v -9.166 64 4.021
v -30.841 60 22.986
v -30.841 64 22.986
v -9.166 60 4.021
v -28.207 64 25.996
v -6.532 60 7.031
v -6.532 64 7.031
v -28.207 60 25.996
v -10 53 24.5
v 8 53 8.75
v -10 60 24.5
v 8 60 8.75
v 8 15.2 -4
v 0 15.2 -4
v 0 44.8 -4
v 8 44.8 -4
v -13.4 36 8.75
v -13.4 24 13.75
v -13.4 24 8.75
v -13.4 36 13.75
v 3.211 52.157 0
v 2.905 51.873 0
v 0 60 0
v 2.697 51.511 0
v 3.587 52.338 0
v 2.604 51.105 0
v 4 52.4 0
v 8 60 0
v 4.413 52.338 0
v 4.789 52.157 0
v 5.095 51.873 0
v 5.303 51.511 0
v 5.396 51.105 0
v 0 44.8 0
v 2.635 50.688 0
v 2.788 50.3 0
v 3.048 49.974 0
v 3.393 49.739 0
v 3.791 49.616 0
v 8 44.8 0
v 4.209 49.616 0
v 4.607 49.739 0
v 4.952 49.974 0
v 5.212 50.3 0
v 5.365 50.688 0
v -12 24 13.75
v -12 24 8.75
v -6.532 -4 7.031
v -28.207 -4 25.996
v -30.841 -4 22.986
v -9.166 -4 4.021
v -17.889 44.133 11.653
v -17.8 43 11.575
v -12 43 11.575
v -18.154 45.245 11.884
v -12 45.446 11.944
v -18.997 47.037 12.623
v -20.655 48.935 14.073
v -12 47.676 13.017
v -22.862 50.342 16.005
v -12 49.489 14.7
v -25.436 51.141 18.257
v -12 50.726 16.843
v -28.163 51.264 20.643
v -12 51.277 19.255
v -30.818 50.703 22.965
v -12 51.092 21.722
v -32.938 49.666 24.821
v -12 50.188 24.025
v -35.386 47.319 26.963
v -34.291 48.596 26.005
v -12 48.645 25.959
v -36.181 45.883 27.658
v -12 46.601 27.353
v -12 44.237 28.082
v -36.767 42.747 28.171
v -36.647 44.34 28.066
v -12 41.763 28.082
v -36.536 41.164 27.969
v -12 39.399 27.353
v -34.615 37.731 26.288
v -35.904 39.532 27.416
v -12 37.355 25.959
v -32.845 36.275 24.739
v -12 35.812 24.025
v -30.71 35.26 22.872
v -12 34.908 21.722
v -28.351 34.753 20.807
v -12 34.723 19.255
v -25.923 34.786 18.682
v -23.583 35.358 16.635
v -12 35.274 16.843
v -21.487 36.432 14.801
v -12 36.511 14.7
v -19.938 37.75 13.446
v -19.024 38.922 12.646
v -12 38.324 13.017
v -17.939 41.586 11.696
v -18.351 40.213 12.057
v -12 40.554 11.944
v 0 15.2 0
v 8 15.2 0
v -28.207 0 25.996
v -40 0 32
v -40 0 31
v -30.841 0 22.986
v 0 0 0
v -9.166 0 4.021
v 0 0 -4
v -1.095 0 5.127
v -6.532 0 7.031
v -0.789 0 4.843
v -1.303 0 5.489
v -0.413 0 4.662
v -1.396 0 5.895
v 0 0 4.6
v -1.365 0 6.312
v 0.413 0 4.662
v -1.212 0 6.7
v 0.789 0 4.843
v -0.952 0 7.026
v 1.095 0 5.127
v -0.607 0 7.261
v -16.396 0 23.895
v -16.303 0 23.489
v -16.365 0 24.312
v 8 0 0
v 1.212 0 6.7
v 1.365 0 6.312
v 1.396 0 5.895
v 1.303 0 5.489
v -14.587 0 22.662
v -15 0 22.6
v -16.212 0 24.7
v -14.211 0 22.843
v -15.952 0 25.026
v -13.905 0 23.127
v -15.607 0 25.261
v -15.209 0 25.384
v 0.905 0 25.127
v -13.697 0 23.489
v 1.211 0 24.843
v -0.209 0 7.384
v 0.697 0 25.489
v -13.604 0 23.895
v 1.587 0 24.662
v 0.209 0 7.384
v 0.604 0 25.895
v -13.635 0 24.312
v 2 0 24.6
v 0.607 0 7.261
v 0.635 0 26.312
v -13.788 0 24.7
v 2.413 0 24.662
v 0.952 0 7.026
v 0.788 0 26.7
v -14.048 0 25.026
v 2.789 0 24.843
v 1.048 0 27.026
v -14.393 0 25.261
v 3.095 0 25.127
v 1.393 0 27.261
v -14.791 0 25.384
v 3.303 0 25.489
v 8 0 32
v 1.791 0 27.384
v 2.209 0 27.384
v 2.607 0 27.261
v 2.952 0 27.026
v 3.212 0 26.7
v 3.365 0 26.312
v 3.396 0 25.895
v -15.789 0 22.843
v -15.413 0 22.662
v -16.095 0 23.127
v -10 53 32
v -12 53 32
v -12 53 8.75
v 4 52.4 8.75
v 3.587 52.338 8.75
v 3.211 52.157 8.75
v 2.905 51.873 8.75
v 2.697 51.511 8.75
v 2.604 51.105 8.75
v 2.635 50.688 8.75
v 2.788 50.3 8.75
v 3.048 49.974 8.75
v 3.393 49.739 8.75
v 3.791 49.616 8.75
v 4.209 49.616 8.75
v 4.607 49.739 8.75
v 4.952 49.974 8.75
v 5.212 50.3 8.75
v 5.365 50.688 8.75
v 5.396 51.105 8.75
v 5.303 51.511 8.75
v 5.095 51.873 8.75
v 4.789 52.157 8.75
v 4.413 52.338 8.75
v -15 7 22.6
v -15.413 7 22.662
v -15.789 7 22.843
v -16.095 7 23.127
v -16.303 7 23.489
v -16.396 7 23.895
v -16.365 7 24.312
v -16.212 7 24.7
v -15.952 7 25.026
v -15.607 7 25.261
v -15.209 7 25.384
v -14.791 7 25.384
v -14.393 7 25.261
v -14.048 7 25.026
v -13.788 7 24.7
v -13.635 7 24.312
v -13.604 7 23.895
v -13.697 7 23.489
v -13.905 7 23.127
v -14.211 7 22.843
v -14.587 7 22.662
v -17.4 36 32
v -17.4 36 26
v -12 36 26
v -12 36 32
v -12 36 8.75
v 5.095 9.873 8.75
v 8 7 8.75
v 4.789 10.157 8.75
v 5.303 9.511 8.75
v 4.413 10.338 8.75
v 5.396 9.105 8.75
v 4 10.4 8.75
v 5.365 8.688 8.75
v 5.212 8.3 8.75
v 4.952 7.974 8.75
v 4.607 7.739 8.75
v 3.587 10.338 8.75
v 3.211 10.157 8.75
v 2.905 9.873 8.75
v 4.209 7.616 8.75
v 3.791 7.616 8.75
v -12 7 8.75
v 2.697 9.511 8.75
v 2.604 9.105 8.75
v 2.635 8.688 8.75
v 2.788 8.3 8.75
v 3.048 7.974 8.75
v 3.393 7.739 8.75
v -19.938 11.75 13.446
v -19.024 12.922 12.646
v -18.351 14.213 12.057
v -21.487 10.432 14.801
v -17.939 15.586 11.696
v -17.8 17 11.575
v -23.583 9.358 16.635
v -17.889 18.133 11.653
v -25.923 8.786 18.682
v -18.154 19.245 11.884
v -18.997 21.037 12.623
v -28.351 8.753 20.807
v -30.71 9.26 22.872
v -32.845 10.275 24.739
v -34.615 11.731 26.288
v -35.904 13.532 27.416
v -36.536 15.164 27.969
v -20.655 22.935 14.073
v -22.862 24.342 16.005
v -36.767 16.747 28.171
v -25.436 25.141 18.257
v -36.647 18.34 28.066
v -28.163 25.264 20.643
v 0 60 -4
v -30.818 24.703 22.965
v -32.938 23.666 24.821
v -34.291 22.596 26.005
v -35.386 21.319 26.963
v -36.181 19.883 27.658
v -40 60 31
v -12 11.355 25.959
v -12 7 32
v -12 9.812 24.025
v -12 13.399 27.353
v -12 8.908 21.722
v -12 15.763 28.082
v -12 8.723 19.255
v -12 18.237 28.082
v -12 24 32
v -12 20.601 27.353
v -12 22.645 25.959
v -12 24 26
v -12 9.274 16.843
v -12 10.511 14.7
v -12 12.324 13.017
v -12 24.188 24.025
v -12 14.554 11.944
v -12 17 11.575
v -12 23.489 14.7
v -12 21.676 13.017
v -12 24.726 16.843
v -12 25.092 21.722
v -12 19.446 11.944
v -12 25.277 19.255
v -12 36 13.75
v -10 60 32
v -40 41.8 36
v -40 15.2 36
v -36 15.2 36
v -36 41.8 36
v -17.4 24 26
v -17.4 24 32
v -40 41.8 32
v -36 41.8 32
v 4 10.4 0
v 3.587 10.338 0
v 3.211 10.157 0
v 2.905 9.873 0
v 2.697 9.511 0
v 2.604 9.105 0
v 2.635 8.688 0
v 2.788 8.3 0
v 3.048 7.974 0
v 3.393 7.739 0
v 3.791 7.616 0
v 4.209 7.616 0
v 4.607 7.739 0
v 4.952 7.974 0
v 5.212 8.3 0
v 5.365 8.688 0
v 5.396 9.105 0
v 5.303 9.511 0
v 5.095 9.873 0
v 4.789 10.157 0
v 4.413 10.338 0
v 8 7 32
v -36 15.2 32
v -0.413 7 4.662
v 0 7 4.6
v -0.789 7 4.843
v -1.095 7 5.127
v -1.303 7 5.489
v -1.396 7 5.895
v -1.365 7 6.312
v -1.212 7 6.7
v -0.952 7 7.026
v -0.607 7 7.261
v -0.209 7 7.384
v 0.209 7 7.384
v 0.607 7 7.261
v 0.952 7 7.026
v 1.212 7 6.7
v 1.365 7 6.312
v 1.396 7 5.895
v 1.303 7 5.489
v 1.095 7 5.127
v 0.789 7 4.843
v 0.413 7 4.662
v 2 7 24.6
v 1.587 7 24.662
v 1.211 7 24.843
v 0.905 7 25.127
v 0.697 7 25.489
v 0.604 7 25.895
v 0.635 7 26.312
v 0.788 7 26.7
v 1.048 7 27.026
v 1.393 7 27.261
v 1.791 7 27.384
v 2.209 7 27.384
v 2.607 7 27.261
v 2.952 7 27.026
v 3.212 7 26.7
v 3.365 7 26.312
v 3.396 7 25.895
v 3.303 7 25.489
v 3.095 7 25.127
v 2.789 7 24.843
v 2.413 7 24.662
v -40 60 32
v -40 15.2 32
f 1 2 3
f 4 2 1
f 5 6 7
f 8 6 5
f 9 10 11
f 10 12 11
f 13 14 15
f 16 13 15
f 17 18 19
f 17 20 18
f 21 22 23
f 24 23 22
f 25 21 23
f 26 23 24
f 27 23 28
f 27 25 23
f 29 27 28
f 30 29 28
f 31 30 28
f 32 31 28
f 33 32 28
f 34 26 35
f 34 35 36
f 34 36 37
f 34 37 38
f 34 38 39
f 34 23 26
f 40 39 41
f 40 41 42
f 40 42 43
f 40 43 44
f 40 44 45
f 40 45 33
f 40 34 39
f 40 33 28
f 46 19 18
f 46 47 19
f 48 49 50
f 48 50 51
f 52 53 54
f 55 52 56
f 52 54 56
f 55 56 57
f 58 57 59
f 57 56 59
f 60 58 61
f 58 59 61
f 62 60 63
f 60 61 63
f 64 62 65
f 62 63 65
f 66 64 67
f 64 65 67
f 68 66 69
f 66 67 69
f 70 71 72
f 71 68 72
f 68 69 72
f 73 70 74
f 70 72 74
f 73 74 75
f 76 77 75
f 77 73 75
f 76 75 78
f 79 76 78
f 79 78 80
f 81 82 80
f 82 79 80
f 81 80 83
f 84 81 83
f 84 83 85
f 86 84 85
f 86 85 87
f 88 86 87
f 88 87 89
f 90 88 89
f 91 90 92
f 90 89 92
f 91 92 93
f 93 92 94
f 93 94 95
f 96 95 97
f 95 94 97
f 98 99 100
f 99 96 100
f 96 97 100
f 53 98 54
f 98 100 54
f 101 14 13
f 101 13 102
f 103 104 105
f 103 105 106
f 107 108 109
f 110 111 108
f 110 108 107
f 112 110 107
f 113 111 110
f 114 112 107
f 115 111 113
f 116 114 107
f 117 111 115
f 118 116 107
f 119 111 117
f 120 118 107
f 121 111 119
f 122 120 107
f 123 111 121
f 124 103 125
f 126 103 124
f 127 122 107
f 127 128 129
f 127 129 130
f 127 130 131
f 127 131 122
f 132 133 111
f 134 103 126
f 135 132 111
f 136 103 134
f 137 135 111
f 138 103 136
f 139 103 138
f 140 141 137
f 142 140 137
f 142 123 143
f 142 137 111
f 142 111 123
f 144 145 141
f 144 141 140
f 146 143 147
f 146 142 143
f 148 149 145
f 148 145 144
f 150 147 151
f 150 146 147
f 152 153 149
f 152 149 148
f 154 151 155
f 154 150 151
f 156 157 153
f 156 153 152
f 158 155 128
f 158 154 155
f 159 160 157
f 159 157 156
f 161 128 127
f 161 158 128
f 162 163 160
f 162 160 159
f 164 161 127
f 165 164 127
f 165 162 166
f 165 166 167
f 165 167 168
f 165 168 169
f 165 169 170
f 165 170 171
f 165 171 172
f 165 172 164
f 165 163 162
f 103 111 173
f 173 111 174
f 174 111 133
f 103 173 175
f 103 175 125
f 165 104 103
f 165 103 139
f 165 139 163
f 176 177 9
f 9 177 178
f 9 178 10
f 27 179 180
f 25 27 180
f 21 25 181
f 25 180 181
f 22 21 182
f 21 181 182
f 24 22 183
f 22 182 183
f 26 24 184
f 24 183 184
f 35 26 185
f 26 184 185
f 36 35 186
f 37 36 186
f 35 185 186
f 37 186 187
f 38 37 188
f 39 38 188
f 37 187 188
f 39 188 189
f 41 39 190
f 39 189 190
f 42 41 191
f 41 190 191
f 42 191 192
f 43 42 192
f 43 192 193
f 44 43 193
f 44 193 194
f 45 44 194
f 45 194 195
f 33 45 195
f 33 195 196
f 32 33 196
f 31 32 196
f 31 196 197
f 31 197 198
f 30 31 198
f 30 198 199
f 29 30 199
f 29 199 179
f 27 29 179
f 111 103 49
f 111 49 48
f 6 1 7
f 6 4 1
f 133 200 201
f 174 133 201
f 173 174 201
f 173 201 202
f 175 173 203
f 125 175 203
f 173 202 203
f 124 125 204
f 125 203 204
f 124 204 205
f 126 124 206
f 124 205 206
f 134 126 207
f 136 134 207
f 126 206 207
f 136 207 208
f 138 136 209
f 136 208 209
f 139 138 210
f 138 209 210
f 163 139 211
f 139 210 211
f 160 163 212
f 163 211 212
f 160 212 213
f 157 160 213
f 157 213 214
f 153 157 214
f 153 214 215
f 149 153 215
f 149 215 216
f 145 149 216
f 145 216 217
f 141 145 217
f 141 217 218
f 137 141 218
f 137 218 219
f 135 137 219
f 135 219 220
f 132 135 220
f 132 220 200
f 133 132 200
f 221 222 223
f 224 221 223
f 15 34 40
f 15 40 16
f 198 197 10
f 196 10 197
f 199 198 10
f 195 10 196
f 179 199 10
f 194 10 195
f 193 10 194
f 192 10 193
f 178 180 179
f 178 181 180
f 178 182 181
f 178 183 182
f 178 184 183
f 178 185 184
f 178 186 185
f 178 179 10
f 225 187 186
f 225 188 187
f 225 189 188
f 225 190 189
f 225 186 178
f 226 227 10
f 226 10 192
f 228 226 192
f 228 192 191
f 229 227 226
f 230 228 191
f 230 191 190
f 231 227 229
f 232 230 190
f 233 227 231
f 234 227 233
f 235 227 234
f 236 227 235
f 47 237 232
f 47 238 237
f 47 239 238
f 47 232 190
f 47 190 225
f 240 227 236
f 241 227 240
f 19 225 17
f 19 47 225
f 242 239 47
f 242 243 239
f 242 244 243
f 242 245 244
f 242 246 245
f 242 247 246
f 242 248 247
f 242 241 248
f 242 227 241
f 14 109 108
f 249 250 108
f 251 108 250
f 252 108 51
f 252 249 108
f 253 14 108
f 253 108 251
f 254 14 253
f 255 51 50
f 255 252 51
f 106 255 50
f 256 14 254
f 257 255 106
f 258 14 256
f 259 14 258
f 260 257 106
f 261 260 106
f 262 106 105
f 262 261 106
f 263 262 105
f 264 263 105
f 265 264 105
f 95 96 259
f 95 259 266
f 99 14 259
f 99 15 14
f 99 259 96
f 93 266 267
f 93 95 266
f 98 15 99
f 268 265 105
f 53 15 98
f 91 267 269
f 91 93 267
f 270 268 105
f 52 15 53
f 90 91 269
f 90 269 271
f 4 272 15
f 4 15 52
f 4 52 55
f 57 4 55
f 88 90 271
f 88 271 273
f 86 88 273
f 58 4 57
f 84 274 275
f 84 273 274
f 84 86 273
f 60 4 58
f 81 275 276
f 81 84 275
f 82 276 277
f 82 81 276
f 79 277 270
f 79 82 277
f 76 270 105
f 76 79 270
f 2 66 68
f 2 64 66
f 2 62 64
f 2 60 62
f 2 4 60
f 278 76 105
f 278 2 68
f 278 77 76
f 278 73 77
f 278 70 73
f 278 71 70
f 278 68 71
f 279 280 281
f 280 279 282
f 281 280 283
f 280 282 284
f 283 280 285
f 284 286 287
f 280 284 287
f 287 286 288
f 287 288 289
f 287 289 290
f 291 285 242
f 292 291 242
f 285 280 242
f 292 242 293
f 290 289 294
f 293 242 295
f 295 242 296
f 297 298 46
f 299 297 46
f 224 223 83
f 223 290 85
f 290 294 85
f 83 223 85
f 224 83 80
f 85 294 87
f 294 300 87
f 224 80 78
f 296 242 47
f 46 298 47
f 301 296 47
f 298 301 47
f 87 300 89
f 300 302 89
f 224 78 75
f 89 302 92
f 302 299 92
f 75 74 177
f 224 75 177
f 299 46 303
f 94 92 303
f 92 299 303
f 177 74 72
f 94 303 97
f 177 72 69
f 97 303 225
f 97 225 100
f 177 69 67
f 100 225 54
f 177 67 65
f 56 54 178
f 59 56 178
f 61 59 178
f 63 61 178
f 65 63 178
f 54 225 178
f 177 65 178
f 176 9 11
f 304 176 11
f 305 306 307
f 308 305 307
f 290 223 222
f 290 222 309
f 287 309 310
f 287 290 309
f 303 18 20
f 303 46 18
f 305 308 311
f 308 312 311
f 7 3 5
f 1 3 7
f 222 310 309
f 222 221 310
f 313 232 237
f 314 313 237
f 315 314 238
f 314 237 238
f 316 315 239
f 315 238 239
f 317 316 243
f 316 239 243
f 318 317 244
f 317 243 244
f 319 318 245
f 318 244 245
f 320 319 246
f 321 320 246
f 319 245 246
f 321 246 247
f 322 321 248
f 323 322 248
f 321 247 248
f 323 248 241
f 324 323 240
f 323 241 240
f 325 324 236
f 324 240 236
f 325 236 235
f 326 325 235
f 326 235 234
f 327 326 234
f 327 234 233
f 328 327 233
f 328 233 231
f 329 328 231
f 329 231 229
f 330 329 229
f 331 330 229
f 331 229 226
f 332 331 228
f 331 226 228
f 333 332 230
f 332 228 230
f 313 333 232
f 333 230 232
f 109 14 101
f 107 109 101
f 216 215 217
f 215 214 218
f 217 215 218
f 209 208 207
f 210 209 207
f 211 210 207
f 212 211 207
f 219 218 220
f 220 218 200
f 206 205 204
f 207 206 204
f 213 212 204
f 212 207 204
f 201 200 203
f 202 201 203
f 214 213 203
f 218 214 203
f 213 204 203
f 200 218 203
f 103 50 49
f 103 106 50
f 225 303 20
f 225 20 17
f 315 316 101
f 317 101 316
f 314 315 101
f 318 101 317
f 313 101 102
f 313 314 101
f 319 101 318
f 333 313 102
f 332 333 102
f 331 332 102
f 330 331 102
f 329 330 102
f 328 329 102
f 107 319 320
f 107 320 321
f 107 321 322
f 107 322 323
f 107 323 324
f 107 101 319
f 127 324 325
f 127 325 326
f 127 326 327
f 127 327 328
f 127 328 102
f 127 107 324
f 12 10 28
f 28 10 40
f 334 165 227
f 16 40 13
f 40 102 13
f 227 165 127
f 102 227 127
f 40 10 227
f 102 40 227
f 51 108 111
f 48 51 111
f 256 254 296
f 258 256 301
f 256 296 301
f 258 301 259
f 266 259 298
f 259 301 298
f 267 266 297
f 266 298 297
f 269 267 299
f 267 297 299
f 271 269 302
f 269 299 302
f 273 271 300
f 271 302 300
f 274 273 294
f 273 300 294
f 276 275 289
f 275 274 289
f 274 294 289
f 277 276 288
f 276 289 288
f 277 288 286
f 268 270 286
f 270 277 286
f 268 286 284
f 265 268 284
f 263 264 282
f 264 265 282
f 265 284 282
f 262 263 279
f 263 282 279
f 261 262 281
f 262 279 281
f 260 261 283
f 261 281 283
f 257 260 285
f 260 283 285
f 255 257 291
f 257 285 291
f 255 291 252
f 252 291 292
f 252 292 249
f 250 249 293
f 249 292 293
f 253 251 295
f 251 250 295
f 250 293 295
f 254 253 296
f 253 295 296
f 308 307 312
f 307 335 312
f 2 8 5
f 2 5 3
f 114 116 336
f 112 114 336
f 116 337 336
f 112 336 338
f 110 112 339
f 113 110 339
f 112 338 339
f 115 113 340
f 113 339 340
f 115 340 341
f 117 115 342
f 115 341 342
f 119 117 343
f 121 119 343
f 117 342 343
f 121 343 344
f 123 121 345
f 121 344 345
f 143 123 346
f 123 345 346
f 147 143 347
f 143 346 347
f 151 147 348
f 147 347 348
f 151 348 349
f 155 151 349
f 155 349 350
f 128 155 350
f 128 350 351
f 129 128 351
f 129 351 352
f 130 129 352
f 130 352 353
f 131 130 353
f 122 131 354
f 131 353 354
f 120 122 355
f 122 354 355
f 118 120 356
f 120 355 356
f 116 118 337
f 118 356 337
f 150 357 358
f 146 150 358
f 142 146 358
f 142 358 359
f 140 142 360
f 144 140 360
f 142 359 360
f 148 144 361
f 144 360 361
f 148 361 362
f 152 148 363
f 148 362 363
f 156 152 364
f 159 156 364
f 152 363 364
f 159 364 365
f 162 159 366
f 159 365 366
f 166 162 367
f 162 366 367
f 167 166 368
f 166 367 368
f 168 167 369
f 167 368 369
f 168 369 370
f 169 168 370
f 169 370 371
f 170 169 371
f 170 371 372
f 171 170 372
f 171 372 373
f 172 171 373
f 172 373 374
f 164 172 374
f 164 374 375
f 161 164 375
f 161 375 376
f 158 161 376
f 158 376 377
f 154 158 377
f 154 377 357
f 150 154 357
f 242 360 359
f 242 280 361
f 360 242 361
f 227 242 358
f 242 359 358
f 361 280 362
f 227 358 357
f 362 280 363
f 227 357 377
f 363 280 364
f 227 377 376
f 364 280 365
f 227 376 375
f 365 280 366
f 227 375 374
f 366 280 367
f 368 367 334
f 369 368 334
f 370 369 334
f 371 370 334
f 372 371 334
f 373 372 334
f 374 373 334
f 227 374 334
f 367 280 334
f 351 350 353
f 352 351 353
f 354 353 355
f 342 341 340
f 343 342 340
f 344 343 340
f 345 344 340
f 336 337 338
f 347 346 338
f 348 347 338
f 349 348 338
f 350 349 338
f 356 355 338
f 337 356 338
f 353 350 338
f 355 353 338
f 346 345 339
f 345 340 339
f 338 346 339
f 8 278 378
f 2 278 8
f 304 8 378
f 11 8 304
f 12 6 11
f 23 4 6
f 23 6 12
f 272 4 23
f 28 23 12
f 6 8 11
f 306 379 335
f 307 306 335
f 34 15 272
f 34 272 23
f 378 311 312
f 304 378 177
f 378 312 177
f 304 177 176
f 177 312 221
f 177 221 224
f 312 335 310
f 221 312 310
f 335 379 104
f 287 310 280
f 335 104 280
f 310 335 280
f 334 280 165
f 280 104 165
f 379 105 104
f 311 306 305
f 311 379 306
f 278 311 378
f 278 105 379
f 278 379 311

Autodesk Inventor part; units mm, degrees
ref_plane "YZ Plane" through (0, 0, 0) normal (1, 0, 0) x (0, 1, 0)
ref_plane "XZ Plane" through (0, 0, 0) normal (0, 1, 0) x (-1, 0, 0)
ref_plane "XY Plane" through (0, 0, 0) normal (0, 0, 1) x (1, 0, 0)
sketch "Эскиз1" plane through (0, 0, 0) normal (0, 1, 0) x (-1, 0, 0)
  line L0 (0, -4) -> (0, 0)
  line L1 (40, 31) -> (10, 31)
  line L2 (40, 31) -> (0, -4)
  line L3 (10, 31) -> (10, 8.75)
  line L4 (10, 8.75) -> (0, 0)
  dimension "d2" = 35
  dimension "d3" = 40
  dimension "d4" = 30
  dimension "d5" = 4
  dimension "d6" = 22.25
extrude "Выдавливание1" add sketch "Эскиз1" along normal blind 60
sketch "Эскиз2" plane through (-10, 0, 31) normal (1, 0, 0) x (0, 0, -1)
  line L0 (0, 0) -> (0, 60) projected
  line L1 (22.25, 0) -> (22.25, 60) projected
  line L2 (0, 53) -> (22.25, 53)
  line L3 (22.25, 53) -> (22.25, 7)
  line L4 (22.25, 7) -> (0, 7)
  line L5 (0, 7) -> (0, 53)
  point P0 (31, 0)
  point P1 (0, 30)
  dimension "d9" = 46
extrude "Выдавливание2" cut sketch "Эскиз2" against normal blind 2
sketch "Эскиз3" plane through (-12, 0, 31) normal (1, 0, 0) x (0, 0, -1)
  circle A0 centre (11.125, 43) radius 8.3
  circle A1 centre (11.125, 17) radius 8.3
  line L0 (11.125, 17) -> (11.125, 43) construction
  line L1 (0, 7) -> (0, 53) projected
  line L2 (0, 53) -> (22.25, 53) projected
  point P0 (31, 0)
  point P1 (11.125, 30)
  point P2 (0, 30)
  point P3 (11.125, 53)
  dimension "d12" = 16.6
  dimension "d13" = 26
extrude "Выдавливание3" cut sketch "Эскиз3" against normal through all
sketch "Эскиз4" plane through (-12, 0, 31) normal (1, 0, 0) x (0, 0, -1)
  line L0 (22.25, 53) -> (22.25, 7) projected
  line L1 (17.25, 36) -> (22.25, 36)
  line L2 (22.25, 36) -> (22.25, 24)
  line L3 (22.25, 24) -> (17.25, 24)
  line L4 (17.25, 24) -> (17.25, 36)
  line L5 (0, 36) -> (5, 36)
  line L6 (5, 36) -> (5, 24)
  line L7 (5, 24) -> (0, 24)
  line L8 (0, 24) -> (0, 36)
  line L9 (0, 7) -> (0, 53) projected
  point P0 (31, 0)
  point P1 (0, 30)
  dimension "d16" = 5
  dimension "d17" = 12
extrude "Выдавливание4" cut sketch "Эскиз4" against normal blind 1.4
sketch "Эскиз5" plane through (0, 0, 0) normal (1, 0, 0) x (0, 0, -1)
  line L0 (4, 0) -> (4, 60) projected
  line L1 (0, 44.8) -> (4, 44.8)
  line L2 (4, 44.8) -> (4, 15.2)
  line L3 (4, 15.2) -> (0, 15.2)
  line L4 (0, 15.2) -> (0, 44.8)
  line L5 (0, 0) -> (0, 60) projected
  point P0 (4, 30)
  dimension "d20" = 29.6
extrude "Выдавливание5" add sketch "Эскиз5" along normal blind 8
sketch "Эскиз6" plane through (-40, 0, 31) normal (0, 0, 1) x (1, 0, 0)
  line L0 (0, 0) -> (0, 60) projected
  line L1 (0, 15.2) -> (4, 15.2)
  line L2 (4, 15.2) -> (4, 41.8)
  line L3 (4, 41.8) -> (0, 41.8)
  line L4 (0, 41.8) -> (0, 15.2)
  point P0 (40, 0)
  point P1 (0, 30)
  dimension "d23" = 4
  dimension "d24" = 26.6
  dimension "d37" = 14.8
extrude "Выдавливание6" add sketch "Эскиз6" along normal blind 5
sketch "Эскиз7" plane through (0, 0, 0) normal (0, -1, 0) x (1, 0, 0)
  line L0 (-9.1664, 4.0206) -> (-6.5324, 7.0309)
  line L1 (-10, 8.75) -> (0, 0) projected
  line L2 (0, -4) -> (-40, 31) projected
  line L3 (-9.1664, 4.0206) -> (-30.8406, 22.9855)
  line L4 (-17.8, 11.575) -> (-36.7714, 28.175) projected
  line L5 (-30.8406, 22.9855) -> (-28.2066, 25.9958)
  line L6 (-28.2066, 25.9958) -> (-6.5324, 7.0309)
  dimension "d28" = 4
  dimension "d29" = 28.8
  dimension "d30" = 12.18
extrude "Выдавливание7" add sketch "Эскиз7" along normal blind 4
sketch "Эскиз8" plane through (0, 60, 0) normal (0, 1, 0) x (1, 0, 0)
  line L0 (-9.1664, -4.0206) -> (-6.5324, -7.0309) projected
  line L1 (-6.5324, -7.0309) -> (-28.2066, -25.9958) projected
  line L2 (-28.2066, -25.9958) -> (-30.8406, -22.9855) projected
  line L3 (-30.8406, -22.9855) -> (-9.1664, -4.0206) projected
  point P0 (0, 0)
extrude "Выдавливание8" add sketch "Эскиз8" along normal blind 4
sketch "Эскиз9" plane through (-40, 0, 31) normal (0, 0, 1) x (1, 0, 0)
  line L0 (0, 41.8) -> (4, 41.8) projected
  line L1 (4, 41.8) -> (4, 15.2) projected
  line L2 (4, 15.2) -> (0, 15.2) projected
  line L3 (0, 0) -> (0, 15.2) projected
  line L4 (0, 0) -> (30, 0) projected
  line L5 (30, 0) -> (30, 7) projected
  line L6 (30, 7) -> (28, 7) projected
  line L7 (28, 7) -> (28, 24) projected
  line L8 (28, 24) -> (26.6, 24) projected
  line L9 (26.6, 24) -> (26.6, 36) projected
  line L10 (26.6, 36) -> (28, 36) projected
  line L11 (28, 36) -> (28, 53) projected
  line L12 (28, 53) -> (30, 53) projected
  line L13 (30, 53) -> (30, 60) projected
  line L14 (0, 60) -> (30, 60) projected
  line L15 (0, 41.8) -> (0, 60) projected
  point P0 (40, 0)
extrude "Выдавливание9" add sketch "Эскиз9" along normal blind 1
sketch "Эскиз10" plane through (-13.4, 0, 31) normal (1, 0, 0) x (0, 0, -1)
  line L0 (5, 24) -> (-1, 24) projected
  line L1 (5, 36) -> (5, 24) projected
  line L2 (-1, 36) -> (5, 36) projected
  line L3 (-1, 24) -> (-1, 36) projected
  point P0 (31, 0)
extrude "Выдавливание10" cut sketch "Эскиз10" against normal blind 4
sketch "Эскиз12" plane through (0, 0, 0) normal (0, -1, 0) x (1, 0, 0)
  line L0 (-10, 8.75) -> (-10, 32) projected
  line L1 (0, 0) -> (8, 0) projected
  line L2 (-10, 8.75) -> (0, 0)
  line L3 (0, 0) -> (8, 0)
  line L4 (8, 0) -> (8, 8.75)
  line L5 (8, 8.75) -> (-10, 8.75)
extrude "Выдавливание11" add sketch "Эскиз12" against normal up to surface (60 mm away)
sketch "Эскиз13" plane through (0, 60, 0) normal (0, 1, 0) x (1, 0, 0)
  line L0 (-10, -32) -> (-10, -8.75) projected
  line L1 (-10, -8.75) -> (8, -8.75)
  line L2 (8, -8.75) -> (-10, -24.5)
  line L3 (-10, -8.75) -> (-12, -8.75) projected
  line L4 (-10, -8.75) -> (-10, -24.5)
  line L5 (0, 4) -> (-9.1664, -4.0206) projected
  point P0 (0, 0)
extrude "Выдавливание12" add sketch "Эскиз13" against normal up to surface (7 mm away)
sketch "Эскиз16" plane through (0, 0, 0) normal (0, -1, 0) x (1, 0, 0)
  line L0 (-10, 8.75) -> (-10, 32) projected
  line L1 (-10, 32) -> (8, 32)
  line L2 (8, 0) -> (8, 8.75) projected
  line L3 (8, 32) -> (8, 8.75)
  line L4 (-10, 8.75) -> (-12, 8.75) projected
  line L5 (8, 8.75) -> (-10, 8.75)
  line L6 (-10, 8.75) -> (-10, 32)
  point P0 (0, 0)
extrude "Выдавливание15" add sketch "Эскиз16" against normal blind 7
sketch "Эскиз17" plane through (8, 44.8, 0) normal (0, 0, -1) x (-1, 0, 0)
  line L0 (8, 15.2) -> (0, 15.2) projected
  line L1 (8, -44.8) -> (0, -44.8) projected
  point P0 (4, 6.2)
  point P1 (4, -35.8)
  point P2 (4, 15.2)
  dimension "d58" = 9
  dimension "d59" = 9
hole "Отверстие1" at (4, 51, 0) at (4, 9, 0) direction (0, 0, 1) diameter 2.8 end through all
sketch "Эскиз19" plane through (0, 0, 0) normal (0, -1, 0) x (1, 0, 0)
  line L0 (0, -4) -> (8, -4) projected
  line L1 (-40, 32) -> (-40, 36) projected
  line L2 (-40, 32) -> (8, 32) projected
  point P0 (0, 0)
  point P1 (-15, 24)
  point P2 (0, 6)
  point P3 (2, 26)
  dimension "d67" = 10
  dimension "d68" = 25
  dimension "d69" = 40
  dimension "d72" = 42
  dimension "d73" = 30
  dimension "d74" = 28
hole "Отверстие2" at (-15, 0, 24) at (0, 0, 6) at (2, 0, 26) direction (0, 1, 0) diameter 2.8 depth 7
properties part number "Sensor" material "Пластик АБС"
